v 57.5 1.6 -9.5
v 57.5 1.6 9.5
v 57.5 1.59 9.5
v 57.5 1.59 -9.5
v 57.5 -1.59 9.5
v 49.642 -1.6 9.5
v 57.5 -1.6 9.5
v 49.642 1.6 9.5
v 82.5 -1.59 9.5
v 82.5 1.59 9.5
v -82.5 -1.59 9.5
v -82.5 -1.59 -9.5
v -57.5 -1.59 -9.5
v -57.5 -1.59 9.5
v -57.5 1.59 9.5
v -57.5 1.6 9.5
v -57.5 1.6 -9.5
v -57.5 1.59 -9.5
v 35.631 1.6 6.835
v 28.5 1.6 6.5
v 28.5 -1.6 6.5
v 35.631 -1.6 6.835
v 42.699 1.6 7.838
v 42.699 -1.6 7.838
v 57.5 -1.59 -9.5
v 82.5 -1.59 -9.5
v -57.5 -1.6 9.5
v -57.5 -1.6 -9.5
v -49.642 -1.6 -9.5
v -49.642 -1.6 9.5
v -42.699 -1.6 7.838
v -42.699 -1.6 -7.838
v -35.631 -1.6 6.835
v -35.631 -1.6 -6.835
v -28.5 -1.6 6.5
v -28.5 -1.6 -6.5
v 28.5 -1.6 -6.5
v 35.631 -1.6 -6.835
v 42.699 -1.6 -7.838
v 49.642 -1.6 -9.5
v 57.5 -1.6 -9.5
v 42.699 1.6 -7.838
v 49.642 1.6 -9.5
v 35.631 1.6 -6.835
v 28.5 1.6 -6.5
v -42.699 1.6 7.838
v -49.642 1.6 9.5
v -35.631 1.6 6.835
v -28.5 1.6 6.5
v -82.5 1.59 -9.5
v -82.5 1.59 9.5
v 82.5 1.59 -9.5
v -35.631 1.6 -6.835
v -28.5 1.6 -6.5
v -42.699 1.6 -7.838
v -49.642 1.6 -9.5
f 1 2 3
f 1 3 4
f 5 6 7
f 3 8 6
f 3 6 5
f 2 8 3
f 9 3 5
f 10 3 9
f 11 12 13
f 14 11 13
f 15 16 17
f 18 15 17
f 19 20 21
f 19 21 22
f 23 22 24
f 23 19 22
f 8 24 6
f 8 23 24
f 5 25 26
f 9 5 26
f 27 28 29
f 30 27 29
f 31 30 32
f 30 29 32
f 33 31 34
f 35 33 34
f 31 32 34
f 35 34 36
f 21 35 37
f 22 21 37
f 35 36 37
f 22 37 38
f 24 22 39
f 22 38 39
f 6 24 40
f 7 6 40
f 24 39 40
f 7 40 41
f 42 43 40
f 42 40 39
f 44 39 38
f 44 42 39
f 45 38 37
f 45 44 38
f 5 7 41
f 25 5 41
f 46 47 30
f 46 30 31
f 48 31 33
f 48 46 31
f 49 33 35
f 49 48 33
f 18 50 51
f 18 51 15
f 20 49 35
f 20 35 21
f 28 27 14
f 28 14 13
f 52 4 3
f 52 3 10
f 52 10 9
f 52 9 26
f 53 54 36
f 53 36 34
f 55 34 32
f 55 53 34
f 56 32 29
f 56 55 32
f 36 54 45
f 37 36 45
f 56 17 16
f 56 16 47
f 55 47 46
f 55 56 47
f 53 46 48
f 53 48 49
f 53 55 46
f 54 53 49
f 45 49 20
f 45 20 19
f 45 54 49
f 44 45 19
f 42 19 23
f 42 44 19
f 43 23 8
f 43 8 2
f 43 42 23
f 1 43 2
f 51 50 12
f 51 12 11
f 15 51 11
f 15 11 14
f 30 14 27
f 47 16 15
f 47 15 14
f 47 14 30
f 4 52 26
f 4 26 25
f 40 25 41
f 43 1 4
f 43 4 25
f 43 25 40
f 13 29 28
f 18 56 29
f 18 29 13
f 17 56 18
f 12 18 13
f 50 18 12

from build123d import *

# Parameters (mm, degrees)
CROQUIS1_W              = 57
CROQUIS1_H              = 13
SALIENTE_EXTRUIR1_DEPTH = 1.6
CROQUIS2_W              = 25
CROQUIS2_H              = 19
CORTAR_EXTRUIR1_DEPTH   = 0.01


with BuildPart() as part:
    # Croquis1 → Saliente-Extruir1 (new body, symmetric)
    with BuildSketch(Plane(origin=(0, 0, 0), x_dir=(1, 0, 0), z_dir=(0, 1, 0))):
        with BuildLine():
            Line((-82.5, -9.5), (-49.642374512, -9.5))
            ThreePointArc((-49.642374512, -9.5), (-39.177078252, -7.253737634), (-28.5, -6.5))
            Line((-28.5, -6.5), (-28.5, 6.5))
            ThreePointArc((-28.5, 6.5), (-39.177078252, 7.253737634), (-49.642374512, 9.5))
            Line((-49.642374512, 9.5), (-82.5, 9.5))
            Line((-82.5, 9.5), (-82.5, -9.5))
        make_face()
        with BuildLine():
            Line((49.642374512, -9.5), (82.5, -9.5))
            Line((82.5, -9.5), (82.5, 9.5))
            Line((82.5, 9.5), (49.642374512, 9.5))
            ThreePointArc((49.642374512, 9.5), (39.177078252, 7.253737634), (28.5, 6.5))
            Line((28.5, 6.5), (28.5, -6.5))
            ThreePointArc((28.5, -6.5), (39.177078252, -7.253737634), (49.642374512, -9.5))
        make_face()
        Rectangle(CROQUIS1_W, CROQUIS1_H)
    extrude(amount=SALIENTE_EXTRUIR1_DEPTH, both=True)

    # Croquis2 → Cortar-Extruir1 (cut)
    with BuildSketch(Plane(origin=(0, 1.6, 0), x_dir=(1, 0, 0), z_dir=(0, 1, 0))):
        with Locations((-70, 0)):
            Rectangle(CROQUIS2_W, CROQUIS2_H)
        with Locations((70, 0)):
            Rectangle(CROQUIS2_W, CROQUIS2_H)
    cortar_extruir1 = extrude(amount=-CORTAR_EXTRUIR1_DEPTH, mode=Mode.SUBTRACT)

    # Simetría1: Cortar-Extruir1 across plane
    add(cortar_extruir1.mirror(Plane.ZX), mode=Mode.SUBTRACT)


solid = part.part
